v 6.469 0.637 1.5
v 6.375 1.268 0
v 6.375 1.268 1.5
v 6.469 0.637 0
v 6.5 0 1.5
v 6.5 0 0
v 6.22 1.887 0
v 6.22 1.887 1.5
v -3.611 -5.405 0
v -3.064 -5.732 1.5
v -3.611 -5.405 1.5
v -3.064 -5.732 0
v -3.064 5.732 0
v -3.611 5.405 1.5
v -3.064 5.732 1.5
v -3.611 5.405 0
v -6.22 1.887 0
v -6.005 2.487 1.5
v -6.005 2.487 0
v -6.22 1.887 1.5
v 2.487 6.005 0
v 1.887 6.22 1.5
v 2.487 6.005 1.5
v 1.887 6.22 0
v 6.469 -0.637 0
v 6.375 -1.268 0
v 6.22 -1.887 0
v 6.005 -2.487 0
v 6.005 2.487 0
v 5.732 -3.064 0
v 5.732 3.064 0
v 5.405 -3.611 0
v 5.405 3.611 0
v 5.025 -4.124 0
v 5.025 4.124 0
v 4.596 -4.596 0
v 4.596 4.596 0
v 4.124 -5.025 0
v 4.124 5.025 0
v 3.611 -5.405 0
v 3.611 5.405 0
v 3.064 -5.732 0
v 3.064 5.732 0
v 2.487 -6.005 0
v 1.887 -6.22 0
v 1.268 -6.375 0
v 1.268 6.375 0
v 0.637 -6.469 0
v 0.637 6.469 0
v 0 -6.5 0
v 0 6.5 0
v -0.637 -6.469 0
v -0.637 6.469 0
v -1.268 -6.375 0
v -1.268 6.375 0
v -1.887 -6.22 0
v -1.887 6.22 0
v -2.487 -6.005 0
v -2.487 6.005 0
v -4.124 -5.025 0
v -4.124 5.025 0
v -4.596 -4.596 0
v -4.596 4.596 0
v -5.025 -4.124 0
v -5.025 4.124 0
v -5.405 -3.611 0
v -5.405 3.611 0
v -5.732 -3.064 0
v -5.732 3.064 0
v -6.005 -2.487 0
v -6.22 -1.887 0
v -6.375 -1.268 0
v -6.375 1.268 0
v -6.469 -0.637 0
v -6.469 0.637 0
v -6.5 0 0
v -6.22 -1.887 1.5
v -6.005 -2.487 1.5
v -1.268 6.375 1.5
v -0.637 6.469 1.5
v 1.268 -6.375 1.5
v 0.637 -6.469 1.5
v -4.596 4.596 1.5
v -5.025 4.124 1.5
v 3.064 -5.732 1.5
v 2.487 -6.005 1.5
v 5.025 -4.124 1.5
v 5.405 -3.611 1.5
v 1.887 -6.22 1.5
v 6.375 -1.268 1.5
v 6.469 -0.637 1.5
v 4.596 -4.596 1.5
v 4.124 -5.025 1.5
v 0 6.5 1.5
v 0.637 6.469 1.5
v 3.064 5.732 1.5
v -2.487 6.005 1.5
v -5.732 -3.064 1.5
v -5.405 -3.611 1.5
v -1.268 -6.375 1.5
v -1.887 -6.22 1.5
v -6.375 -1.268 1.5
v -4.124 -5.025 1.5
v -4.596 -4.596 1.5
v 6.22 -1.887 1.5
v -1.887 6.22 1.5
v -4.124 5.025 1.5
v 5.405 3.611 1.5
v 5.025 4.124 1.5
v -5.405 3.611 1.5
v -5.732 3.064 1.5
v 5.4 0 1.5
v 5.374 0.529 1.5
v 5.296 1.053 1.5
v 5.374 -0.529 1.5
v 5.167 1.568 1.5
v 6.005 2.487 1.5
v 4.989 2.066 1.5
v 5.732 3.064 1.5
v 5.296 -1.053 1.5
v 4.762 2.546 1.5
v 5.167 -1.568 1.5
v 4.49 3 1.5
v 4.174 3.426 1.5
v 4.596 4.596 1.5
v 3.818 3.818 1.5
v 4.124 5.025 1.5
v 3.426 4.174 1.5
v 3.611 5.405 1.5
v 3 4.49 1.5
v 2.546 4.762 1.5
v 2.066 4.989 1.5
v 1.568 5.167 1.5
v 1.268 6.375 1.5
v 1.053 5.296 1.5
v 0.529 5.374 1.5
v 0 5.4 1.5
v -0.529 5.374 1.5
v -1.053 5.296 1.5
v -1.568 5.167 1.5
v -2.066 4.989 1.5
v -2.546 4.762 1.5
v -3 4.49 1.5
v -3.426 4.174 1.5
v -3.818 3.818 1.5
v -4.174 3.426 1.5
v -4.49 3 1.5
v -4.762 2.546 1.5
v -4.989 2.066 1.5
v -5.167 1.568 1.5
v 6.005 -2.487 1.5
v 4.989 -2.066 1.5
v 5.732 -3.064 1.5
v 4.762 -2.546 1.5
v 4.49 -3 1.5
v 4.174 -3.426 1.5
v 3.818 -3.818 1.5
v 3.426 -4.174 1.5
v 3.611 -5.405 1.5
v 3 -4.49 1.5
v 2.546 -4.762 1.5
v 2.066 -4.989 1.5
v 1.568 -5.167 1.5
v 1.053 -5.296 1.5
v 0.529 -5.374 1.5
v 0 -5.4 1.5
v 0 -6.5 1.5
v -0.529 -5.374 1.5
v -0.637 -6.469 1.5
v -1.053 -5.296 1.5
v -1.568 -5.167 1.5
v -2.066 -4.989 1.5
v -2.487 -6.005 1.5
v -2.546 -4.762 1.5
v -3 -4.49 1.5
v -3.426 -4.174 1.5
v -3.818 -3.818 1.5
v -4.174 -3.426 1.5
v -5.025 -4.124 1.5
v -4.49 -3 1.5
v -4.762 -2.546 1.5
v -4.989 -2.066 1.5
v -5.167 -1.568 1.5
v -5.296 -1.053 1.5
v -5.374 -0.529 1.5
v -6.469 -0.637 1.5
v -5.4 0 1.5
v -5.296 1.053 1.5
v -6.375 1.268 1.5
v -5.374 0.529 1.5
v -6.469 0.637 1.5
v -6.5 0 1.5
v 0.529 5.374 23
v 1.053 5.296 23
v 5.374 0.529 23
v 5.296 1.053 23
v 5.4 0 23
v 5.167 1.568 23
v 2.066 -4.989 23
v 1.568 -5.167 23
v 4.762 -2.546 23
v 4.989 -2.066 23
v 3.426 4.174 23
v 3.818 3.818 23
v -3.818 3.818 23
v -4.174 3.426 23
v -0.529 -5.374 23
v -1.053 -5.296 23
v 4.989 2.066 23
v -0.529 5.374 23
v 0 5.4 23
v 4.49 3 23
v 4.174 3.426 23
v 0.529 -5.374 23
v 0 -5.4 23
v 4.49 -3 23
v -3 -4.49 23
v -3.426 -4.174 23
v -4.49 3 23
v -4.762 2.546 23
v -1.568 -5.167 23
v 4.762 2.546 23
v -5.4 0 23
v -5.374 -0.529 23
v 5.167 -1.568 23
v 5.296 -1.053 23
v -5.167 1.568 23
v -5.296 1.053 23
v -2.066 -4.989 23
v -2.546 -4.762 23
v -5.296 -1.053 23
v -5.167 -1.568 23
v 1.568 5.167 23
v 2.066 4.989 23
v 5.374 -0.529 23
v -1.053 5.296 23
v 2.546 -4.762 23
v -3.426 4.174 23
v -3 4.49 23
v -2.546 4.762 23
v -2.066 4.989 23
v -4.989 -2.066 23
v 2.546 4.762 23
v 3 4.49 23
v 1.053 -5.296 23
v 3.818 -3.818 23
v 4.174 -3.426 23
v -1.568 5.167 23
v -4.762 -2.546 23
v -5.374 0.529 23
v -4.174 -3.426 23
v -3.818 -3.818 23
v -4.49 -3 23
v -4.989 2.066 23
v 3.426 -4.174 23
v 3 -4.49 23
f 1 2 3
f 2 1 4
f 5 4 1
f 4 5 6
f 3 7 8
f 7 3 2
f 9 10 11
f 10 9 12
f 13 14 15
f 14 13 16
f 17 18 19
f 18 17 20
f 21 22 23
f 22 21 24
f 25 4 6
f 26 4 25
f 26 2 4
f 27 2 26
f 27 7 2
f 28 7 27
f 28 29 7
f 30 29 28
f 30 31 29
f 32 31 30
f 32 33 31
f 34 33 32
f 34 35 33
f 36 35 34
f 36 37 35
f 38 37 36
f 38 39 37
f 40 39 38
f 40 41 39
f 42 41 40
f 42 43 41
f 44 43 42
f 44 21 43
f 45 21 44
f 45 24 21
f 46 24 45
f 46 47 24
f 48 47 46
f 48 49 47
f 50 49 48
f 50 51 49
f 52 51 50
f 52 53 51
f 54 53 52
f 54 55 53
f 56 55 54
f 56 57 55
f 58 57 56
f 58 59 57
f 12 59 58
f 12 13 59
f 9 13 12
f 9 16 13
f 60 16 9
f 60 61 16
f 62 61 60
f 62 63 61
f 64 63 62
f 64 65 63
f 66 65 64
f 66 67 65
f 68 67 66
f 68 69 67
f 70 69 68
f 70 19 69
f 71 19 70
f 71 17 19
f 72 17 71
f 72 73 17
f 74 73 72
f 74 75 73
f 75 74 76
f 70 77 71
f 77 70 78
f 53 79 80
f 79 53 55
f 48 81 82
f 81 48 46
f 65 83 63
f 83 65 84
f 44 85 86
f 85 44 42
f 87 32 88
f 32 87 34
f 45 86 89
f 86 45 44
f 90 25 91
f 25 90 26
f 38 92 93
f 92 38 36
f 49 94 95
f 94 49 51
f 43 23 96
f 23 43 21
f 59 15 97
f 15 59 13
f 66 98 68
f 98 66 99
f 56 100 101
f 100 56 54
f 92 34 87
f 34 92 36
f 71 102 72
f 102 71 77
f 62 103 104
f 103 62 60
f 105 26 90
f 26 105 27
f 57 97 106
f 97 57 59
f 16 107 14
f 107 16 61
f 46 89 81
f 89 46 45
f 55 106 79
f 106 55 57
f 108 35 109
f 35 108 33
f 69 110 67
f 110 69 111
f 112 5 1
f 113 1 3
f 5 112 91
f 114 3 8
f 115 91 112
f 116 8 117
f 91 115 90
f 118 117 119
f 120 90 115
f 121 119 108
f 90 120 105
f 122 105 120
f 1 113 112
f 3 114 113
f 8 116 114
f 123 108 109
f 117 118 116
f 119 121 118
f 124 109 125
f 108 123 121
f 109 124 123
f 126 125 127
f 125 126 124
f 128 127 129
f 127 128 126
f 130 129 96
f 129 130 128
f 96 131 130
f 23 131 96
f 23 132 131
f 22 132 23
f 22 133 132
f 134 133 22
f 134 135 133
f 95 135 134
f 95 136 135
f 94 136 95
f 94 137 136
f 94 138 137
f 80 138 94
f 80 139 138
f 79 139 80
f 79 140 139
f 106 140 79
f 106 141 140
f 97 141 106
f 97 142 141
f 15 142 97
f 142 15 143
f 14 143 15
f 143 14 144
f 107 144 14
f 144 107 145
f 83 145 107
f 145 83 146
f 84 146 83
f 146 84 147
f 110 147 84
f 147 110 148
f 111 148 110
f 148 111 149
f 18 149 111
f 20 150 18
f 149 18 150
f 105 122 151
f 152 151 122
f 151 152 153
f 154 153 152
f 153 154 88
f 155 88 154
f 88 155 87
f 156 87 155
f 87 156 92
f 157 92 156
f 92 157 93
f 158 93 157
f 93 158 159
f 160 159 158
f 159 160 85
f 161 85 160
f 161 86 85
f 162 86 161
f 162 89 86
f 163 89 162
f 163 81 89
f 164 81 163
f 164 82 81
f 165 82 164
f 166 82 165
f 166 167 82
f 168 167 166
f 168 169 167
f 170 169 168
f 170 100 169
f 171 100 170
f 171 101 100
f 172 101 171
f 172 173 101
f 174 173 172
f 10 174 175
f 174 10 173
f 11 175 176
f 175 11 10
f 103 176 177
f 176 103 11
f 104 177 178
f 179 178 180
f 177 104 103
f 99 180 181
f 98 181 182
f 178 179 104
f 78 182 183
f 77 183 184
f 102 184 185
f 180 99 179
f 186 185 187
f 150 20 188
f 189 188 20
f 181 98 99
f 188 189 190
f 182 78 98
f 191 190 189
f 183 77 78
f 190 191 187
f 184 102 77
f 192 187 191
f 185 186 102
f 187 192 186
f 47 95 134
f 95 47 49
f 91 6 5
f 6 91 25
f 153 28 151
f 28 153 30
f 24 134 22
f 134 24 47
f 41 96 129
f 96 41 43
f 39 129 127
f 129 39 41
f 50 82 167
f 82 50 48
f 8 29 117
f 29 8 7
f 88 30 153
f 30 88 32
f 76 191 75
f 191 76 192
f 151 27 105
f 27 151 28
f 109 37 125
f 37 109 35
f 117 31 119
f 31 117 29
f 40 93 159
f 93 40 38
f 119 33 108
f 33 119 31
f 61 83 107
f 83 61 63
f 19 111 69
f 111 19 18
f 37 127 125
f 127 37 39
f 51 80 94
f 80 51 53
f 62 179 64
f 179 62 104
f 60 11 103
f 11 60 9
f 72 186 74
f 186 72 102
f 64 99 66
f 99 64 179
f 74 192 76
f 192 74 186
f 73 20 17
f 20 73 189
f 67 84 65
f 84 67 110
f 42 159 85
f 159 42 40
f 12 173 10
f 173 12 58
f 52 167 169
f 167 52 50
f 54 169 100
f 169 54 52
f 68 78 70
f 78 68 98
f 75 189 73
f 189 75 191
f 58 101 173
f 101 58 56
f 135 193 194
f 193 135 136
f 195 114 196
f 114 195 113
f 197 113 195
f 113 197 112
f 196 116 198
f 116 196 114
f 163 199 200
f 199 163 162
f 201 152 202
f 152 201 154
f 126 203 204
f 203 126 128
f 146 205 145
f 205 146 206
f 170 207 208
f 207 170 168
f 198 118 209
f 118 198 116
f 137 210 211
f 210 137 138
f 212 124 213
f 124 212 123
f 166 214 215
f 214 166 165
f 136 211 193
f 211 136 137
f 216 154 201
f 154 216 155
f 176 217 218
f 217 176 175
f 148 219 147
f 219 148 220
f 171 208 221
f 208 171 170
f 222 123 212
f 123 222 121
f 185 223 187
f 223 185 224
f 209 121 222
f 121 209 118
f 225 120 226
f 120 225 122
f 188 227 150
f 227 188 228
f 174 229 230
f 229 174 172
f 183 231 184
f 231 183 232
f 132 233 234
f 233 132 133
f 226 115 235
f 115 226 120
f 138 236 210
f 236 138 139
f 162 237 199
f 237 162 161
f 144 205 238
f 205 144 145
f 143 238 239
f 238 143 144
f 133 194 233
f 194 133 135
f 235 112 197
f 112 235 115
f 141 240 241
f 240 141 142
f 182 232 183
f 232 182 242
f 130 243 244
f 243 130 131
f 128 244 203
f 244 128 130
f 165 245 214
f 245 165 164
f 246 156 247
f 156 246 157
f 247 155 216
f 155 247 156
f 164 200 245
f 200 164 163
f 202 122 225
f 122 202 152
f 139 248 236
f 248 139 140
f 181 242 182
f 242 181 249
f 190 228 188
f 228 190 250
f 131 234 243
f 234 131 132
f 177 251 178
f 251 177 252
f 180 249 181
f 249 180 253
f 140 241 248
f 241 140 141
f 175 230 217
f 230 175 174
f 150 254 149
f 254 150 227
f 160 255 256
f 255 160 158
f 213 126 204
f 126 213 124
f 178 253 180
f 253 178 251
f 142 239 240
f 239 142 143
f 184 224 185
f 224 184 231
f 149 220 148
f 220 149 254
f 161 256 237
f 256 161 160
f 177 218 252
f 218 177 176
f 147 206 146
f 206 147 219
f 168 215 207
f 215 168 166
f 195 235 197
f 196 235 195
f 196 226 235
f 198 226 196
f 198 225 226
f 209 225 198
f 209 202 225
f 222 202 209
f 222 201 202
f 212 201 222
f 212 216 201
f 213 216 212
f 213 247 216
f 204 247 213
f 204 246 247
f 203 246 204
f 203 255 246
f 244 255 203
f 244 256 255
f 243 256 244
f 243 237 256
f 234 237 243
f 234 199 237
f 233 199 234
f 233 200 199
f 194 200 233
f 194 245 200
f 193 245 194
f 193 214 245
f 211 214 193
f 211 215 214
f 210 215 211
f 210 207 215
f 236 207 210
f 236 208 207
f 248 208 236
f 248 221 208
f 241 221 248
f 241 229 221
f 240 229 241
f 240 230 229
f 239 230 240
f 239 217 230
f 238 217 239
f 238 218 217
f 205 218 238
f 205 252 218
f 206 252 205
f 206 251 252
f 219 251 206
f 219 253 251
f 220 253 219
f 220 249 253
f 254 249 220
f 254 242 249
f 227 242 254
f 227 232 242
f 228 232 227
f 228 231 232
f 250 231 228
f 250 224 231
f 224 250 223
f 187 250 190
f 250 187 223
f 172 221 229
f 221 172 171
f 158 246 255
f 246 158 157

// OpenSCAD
// Adapter sleeve: 0.2 mL PCR tube to 1.5 mL rack hole
// Dimensions measured with calipers

// Collar (base) dimensions
collar_diameter = 13;
collar_thickness = 1.5;

// Sleeve body dimensions
sleeve_outer_diameter = 10.8;
sleeve_height = 21.5;

// Bore (inner hole) dimensions
bore_diameter = 6.2;

// Total height of part
total_height = collar_thickness + sleeve_height;

// Resolution for curved shapes
$fn = 64;

// Main body: collar + sleeve
union() {
    // Collar: rests on bed from z=0 to z=1.5
    translate([0, 0, 0])
        cylinder(h = collar_thickness, r = collar_diameter / 2, center = false);
    
    // Sleeve body: rises from collar to z=21.5
    translate([0, 0, collar_thickness])
        cylinder(h = sleeve_height, r = sleeve_outer_diameter / 2, center = false);
}

// Bore: straight hole through full height, open at both ends
// Extend 1 mm past top and bottom to ensure clean cut
difference() {
    // (The union above is implicitly the first operand if we structure it correctly)
    // We need to restructure: put the solid in difference, then subtract bore
}

// Correct structure: difference with solid then bore
difference() {
    // Solid part
    union() {
        // Collar
        translate([0, 0, 0])
            cylinder(h = collar_thickness, r = collar_diameter / 2, center = false);
        
        // Sleeve body
        translate([0, 0, collar_thickness])
            cylinder(h = sleeve_height, r = sleeve_outer_diameter / 2, center = false);
    }
    
    // Bore hole: extends 1 mm below z=0 and 1 mm above z=total_height
    translate([0, 0, -1])
        cylinder(h = total_height + 2, r = bore_diameter / 2, center = false);
}
